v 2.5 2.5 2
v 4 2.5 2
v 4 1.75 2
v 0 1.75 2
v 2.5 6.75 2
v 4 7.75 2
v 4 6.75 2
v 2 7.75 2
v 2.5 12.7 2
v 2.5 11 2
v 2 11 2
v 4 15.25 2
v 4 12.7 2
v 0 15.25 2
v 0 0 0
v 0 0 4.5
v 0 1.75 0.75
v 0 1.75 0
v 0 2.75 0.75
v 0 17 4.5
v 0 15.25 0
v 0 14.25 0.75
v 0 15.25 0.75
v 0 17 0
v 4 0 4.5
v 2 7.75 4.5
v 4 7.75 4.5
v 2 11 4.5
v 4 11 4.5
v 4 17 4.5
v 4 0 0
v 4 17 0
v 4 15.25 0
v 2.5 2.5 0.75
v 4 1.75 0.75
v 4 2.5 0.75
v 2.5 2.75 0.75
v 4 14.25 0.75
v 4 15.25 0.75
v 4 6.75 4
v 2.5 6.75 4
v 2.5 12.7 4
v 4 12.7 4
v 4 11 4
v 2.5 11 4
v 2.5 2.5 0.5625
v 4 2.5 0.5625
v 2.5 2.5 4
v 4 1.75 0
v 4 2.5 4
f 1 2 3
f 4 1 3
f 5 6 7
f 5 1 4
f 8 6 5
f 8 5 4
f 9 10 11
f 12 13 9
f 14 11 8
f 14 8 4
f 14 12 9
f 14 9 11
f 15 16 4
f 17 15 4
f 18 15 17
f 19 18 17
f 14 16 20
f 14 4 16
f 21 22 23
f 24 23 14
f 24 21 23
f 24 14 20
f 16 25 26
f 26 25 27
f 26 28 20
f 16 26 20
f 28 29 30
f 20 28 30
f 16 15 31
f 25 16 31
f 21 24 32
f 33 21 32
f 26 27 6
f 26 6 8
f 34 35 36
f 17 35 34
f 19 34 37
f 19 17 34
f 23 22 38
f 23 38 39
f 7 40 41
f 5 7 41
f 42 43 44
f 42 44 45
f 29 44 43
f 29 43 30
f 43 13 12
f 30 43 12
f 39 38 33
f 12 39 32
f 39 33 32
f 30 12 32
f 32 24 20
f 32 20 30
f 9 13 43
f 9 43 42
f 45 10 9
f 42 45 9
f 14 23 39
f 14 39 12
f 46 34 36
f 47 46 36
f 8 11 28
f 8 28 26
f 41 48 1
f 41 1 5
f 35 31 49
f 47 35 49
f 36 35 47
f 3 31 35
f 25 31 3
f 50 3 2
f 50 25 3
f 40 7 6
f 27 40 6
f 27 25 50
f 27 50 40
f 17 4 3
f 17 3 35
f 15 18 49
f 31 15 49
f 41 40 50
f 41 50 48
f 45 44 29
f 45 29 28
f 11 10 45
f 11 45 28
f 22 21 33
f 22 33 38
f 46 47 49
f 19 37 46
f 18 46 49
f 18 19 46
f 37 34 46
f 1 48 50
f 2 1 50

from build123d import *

# Parameters (mm, degrees)
SKETCH1_W           = 4
SKETCH1_H           = 17
BOSS_EXTRUDE1_DEPTH = 6
SKETCH2_W           = 2
SKETCH2_H           = 3.25
SKETCH2_W_2         = 1.5
SKETCH2_H_2         = 1.25
CUT_EXTRUDE1_DEPTH  = 19.466185313
CUT_EXTRUDE2_DEPTH  = 19.466185313
SKETCH4_W           = 2
SKETCH4_H           = 1.25
BOSS_EXTRUDE2_DEPTH = 2
BOSS_EXTRUDE3_DEPTH = 2
SKETCH6_W           = 1.5
SKETCH6_H           = 1.7
SKETCH6_H_2         = 4
CUT_EXTRUDE3_DEPTH  = 2
SKETCH7_W           = 4
SKETCH7_H           = 17
CUT_EXTRUDE4_DEPTH  = 10
SKETCH8_W           = 1.5
SKETCH8_H           = 1
BOSS_EXTRUDE4_DEPTH = 2


with BuildPart() as part:
    # Sketch1 → Boss-Extrude1 (new body)
    with BuildSketch(Plane.XY):
        with Locations((2, 8.5)):
            Rectangle(SKETCH1_W, SKETCH1_H)
    extrude(amount=BOSS_EXTRUDE1_DEPTH)

    # Sketch2 → Cut-Extrude1 (cut, through all)
    with BuildSketch(Plane.XY.offset(6)):
        with Locations((3, 9.375)):
            Rectangle(SKETCH2_W, SKETCH2_H)
        with Locations((3.25, 3.125)):
            Rectangle(SKETCH2_W_2, SKETCH2_H_2)
    extrude(amount=-CUT_EXTRUDE1_DEPTH, mode=Mode.SUBTRACT)

    # Sketch3 → Cut-Extrude2 (cut, through all)
    with BuildSketch(Plane.ZY):
        Polygon((0, 15.25), (0.75, 14.25), (0.75, 15.25), (2, 15.25), (2, 1.75), (0.75, 1.75), (0.75, 2.75), (0, 1.75), align=None)
    extrude(amount=-CUT_EXTRUDE2_DEPTH, mode=Mode.SUBTRACT)

    # Sketch4 → Boss-Extrude2 (add)
    with BuildSketch(Plane(origin=(4, 0, 0), x_dir=(0, 0, -1), z_dir=(1, 0, 0))):
        with Locations((-5, 3.125)):
            Rectangle(SKETCH4_W, SKETCH4_H)
    extrude(amount=-BOSS_EXTRUDE2_DEPTH)

    # Sketch5 → Boss-Extrude3 (add)
    with BuildSketch(Plane.XY.offset(6)):
        Polygon((0, 14.5), (2, 14.5), (2, 12.2), (4, 12.2), (4, 11), (2, 11), (2, 7.75), (4, 7.75), (4, 6.55), (2, 6.55), (2, 2.5), (0, 2.5), align=None)
    extrude(amount=BOSS_EXTRUDE3_DEPTH)

    # Sketch6 → Cut-Extrude3 (cut)
    with BuildSketch(Plane(origin=(0, 0, 2), x_dir=(-1, 0, 0), z_dir=(0, 0, -1))):
        with Locations((-3.25, 11.85)):
            Rectangle(SKETCH6_W, SKETCH6_H)
        with Locations((-3.25, 5.75)):
            Rectangle(SKETCH6_W, SKETCH6_H_2)
    extrude(amount=-CUT_EXTRUDE3_DEPTH, mode=Mode.SUBTRACT)

    # Sketch7 → Cut-Extrude4 (cut)
    with BuildSketch(Plane(origin=(4, 0, 0), x_dir=(0, 0, -1), z_dir=(1, 0, 0))):
        with Locations((-6.5, 8.5)):
            Rectangle(SKETCH7_W, SKETCH7_H)
    extrude(amount=-CUT_EXTRUDE4_DEPTH, mode=Mode.SUBTRACT)

    # Sketch8 → Boss-Extrude4 (add)
    with BuildSketch(Plane(origin=(0, 0, 4), x_dir=(-1, 0, 0), z_dir=(0, 0, -1))):
        with Locations((-3.25, 7.25)):
            Rectangle(SKETCH8_W, SKETCH8_H)
    extrude(amount=BOSS_EXTRUDE4_DEPTH)


solid = part.part
